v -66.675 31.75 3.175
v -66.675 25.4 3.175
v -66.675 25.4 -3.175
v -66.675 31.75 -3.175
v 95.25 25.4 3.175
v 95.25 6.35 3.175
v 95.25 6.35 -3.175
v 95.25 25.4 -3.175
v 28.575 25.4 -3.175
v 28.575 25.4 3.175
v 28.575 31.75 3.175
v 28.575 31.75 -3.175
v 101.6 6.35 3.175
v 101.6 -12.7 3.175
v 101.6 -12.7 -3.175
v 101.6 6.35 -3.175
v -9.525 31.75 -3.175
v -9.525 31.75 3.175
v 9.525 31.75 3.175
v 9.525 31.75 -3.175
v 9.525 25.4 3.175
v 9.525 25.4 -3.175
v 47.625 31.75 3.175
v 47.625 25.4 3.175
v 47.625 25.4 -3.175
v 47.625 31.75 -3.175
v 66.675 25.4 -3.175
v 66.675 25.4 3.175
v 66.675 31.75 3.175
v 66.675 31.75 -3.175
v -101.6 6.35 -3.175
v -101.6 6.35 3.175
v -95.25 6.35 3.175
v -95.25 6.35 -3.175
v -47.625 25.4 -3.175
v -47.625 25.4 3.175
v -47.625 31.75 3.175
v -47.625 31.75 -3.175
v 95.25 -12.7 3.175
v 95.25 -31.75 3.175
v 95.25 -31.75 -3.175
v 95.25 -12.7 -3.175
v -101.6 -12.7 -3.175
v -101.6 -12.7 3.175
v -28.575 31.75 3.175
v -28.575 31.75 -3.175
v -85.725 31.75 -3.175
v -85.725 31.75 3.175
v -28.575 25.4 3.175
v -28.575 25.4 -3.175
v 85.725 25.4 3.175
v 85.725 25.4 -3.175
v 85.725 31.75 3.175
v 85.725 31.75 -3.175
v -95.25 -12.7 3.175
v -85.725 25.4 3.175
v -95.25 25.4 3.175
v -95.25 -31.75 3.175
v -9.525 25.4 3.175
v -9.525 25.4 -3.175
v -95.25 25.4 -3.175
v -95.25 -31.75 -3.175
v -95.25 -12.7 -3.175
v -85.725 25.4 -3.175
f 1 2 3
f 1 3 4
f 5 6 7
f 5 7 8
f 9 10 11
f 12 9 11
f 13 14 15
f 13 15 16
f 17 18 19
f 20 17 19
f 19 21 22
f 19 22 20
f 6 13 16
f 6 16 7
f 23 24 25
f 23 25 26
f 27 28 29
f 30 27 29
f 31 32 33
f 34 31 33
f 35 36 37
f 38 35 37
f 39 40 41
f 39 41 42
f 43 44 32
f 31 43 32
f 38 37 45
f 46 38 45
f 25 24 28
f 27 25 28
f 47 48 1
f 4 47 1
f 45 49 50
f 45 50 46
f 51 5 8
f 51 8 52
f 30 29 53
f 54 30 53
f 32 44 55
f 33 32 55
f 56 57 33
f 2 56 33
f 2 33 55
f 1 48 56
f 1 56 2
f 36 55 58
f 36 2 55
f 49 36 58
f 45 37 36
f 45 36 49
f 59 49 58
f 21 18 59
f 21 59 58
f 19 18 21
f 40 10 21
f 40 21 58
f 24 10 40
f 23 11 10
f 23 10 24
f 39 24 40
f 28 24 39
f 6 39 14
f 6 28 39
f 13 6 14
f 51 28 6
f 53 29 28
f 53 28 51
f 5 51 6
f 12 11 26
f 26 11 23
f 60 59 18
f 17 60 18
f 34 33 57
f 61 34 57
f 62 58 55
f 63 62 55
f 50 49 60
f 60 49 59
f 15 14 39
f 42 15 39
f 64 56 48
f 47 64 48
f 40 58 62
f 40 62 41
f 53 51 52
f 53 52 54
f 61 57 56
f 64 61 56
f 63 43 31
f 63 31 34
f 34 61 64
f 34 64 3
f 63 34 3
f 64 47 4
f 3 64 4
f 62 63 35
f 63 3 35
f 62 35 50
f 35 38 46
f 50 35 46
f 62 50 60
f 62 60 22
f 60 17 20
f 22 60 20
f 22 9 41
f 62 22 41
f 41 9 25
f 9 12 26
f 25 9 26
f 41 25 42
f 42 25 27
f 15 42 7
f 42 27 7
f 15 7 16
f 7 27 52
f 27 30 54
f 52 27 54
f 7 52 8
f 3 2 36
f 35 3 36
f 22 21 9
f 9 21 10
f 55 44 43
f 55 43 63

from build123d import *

# Parameters (mm, degrees)
SKETCH1_W           = 203.2
SKETCH1_H           = 63.5
BOSS_EXTRUDE1_DEPTH = 3.175
SKETCH2_W           = 15.875
SKETCH2_H           = 6.35
CUT_EXTRUDE1_DEPTH  = 107.634633211
SKETCH3_W           = 19.05
SKETCH3_H           = 6.35
CUT_EXTRUDE2_DEPTH  = 107.634633211
LPATTERN1_COUNT     = 4
LPATTERN1_PITCH     = 38.1
SKETCH4_W           = 6.35
SKETCH4_H           = 19.05
CUT_EXTRUDE3_DEPTH  = 107.634633211


with BuildPart() as part:
    # Sketch1 → Boss-Extrude1 (new, symmetric)
    with BuildSketch(Plane.XY):
        Rectangle(SKETCH1_W, SKETCH1_H)
    extrude(amount=BOSS_EXTRUDE1_DEPTH, both=True)

    # Sketch2 → Cut-Extrude1 (cut, through all)
    with BuildSketch(Plane.XY.offset(3.175)):
        with Locations((-93.6625, 28.575)):
            Rectangle(SKETCH2_W, SKETCH2_H)
    cut_extrude1 = extrude(amount=-CUT_EXTRUDE1_DEPTH, mode=Mode.SUBTRACT)

    # Mirror1: Cut-Extrude1 across plane
    add(cut_extrude1.mirror(Plane(origin=(0, 0, 0), x_dir=(0, 0, 1), z_dir=(1, 0, 0))), mode=Mode.SUBTRACT)

    # Sketch3 → Cut-Extrude2 (cut, through all)
    with BuildSketch(Plane.XY.offset(3.175)):
        with Locations((-57.15, 28.575)):
            Rectangle(SKETCH3_W, SKETCH3_H)
    cut_extrude2 = extrude(amount=-CUT_EXTRUDE2_DEPTH, mode=Mode.SUBTRACT)

    # LPattern1: Cut-Extrude2 ×4
    with Locations(*[(i * LPATTERN1_PITCH, 0, 0) for i in range(1, LPATTERN1_COUNT)]):
        add(cut_extrude2, mode=Mode.SUBTRACT)

    # Sketch4 → Cut-Extrude3 (cut, through all)
    with BuildSketch(Plane.XY.offset(3.175)):
        with Locations((-98.425, 15.875)):
            Rectangle(SKETCH4_W, SKETCH4_H)
        with Locations((-98.425, -22.225)):
            Rectangle(SKETCH4_W, SKETCH4_H)
    cut_extrude3 = extrude(amount=-CUT_EXTRUDE3_DEPTH, mode=Mode.SUBTRACT)

    # Mirror2: Cut-Extrude3 across plane
    add(cut_extrude3.mirror(Plane(origin=(0, 0, 0), x_dir=(0, 0, 1), z_dir=(1, 0, 0))), mode=Mode.SUBTRACT)


solid = part.part
